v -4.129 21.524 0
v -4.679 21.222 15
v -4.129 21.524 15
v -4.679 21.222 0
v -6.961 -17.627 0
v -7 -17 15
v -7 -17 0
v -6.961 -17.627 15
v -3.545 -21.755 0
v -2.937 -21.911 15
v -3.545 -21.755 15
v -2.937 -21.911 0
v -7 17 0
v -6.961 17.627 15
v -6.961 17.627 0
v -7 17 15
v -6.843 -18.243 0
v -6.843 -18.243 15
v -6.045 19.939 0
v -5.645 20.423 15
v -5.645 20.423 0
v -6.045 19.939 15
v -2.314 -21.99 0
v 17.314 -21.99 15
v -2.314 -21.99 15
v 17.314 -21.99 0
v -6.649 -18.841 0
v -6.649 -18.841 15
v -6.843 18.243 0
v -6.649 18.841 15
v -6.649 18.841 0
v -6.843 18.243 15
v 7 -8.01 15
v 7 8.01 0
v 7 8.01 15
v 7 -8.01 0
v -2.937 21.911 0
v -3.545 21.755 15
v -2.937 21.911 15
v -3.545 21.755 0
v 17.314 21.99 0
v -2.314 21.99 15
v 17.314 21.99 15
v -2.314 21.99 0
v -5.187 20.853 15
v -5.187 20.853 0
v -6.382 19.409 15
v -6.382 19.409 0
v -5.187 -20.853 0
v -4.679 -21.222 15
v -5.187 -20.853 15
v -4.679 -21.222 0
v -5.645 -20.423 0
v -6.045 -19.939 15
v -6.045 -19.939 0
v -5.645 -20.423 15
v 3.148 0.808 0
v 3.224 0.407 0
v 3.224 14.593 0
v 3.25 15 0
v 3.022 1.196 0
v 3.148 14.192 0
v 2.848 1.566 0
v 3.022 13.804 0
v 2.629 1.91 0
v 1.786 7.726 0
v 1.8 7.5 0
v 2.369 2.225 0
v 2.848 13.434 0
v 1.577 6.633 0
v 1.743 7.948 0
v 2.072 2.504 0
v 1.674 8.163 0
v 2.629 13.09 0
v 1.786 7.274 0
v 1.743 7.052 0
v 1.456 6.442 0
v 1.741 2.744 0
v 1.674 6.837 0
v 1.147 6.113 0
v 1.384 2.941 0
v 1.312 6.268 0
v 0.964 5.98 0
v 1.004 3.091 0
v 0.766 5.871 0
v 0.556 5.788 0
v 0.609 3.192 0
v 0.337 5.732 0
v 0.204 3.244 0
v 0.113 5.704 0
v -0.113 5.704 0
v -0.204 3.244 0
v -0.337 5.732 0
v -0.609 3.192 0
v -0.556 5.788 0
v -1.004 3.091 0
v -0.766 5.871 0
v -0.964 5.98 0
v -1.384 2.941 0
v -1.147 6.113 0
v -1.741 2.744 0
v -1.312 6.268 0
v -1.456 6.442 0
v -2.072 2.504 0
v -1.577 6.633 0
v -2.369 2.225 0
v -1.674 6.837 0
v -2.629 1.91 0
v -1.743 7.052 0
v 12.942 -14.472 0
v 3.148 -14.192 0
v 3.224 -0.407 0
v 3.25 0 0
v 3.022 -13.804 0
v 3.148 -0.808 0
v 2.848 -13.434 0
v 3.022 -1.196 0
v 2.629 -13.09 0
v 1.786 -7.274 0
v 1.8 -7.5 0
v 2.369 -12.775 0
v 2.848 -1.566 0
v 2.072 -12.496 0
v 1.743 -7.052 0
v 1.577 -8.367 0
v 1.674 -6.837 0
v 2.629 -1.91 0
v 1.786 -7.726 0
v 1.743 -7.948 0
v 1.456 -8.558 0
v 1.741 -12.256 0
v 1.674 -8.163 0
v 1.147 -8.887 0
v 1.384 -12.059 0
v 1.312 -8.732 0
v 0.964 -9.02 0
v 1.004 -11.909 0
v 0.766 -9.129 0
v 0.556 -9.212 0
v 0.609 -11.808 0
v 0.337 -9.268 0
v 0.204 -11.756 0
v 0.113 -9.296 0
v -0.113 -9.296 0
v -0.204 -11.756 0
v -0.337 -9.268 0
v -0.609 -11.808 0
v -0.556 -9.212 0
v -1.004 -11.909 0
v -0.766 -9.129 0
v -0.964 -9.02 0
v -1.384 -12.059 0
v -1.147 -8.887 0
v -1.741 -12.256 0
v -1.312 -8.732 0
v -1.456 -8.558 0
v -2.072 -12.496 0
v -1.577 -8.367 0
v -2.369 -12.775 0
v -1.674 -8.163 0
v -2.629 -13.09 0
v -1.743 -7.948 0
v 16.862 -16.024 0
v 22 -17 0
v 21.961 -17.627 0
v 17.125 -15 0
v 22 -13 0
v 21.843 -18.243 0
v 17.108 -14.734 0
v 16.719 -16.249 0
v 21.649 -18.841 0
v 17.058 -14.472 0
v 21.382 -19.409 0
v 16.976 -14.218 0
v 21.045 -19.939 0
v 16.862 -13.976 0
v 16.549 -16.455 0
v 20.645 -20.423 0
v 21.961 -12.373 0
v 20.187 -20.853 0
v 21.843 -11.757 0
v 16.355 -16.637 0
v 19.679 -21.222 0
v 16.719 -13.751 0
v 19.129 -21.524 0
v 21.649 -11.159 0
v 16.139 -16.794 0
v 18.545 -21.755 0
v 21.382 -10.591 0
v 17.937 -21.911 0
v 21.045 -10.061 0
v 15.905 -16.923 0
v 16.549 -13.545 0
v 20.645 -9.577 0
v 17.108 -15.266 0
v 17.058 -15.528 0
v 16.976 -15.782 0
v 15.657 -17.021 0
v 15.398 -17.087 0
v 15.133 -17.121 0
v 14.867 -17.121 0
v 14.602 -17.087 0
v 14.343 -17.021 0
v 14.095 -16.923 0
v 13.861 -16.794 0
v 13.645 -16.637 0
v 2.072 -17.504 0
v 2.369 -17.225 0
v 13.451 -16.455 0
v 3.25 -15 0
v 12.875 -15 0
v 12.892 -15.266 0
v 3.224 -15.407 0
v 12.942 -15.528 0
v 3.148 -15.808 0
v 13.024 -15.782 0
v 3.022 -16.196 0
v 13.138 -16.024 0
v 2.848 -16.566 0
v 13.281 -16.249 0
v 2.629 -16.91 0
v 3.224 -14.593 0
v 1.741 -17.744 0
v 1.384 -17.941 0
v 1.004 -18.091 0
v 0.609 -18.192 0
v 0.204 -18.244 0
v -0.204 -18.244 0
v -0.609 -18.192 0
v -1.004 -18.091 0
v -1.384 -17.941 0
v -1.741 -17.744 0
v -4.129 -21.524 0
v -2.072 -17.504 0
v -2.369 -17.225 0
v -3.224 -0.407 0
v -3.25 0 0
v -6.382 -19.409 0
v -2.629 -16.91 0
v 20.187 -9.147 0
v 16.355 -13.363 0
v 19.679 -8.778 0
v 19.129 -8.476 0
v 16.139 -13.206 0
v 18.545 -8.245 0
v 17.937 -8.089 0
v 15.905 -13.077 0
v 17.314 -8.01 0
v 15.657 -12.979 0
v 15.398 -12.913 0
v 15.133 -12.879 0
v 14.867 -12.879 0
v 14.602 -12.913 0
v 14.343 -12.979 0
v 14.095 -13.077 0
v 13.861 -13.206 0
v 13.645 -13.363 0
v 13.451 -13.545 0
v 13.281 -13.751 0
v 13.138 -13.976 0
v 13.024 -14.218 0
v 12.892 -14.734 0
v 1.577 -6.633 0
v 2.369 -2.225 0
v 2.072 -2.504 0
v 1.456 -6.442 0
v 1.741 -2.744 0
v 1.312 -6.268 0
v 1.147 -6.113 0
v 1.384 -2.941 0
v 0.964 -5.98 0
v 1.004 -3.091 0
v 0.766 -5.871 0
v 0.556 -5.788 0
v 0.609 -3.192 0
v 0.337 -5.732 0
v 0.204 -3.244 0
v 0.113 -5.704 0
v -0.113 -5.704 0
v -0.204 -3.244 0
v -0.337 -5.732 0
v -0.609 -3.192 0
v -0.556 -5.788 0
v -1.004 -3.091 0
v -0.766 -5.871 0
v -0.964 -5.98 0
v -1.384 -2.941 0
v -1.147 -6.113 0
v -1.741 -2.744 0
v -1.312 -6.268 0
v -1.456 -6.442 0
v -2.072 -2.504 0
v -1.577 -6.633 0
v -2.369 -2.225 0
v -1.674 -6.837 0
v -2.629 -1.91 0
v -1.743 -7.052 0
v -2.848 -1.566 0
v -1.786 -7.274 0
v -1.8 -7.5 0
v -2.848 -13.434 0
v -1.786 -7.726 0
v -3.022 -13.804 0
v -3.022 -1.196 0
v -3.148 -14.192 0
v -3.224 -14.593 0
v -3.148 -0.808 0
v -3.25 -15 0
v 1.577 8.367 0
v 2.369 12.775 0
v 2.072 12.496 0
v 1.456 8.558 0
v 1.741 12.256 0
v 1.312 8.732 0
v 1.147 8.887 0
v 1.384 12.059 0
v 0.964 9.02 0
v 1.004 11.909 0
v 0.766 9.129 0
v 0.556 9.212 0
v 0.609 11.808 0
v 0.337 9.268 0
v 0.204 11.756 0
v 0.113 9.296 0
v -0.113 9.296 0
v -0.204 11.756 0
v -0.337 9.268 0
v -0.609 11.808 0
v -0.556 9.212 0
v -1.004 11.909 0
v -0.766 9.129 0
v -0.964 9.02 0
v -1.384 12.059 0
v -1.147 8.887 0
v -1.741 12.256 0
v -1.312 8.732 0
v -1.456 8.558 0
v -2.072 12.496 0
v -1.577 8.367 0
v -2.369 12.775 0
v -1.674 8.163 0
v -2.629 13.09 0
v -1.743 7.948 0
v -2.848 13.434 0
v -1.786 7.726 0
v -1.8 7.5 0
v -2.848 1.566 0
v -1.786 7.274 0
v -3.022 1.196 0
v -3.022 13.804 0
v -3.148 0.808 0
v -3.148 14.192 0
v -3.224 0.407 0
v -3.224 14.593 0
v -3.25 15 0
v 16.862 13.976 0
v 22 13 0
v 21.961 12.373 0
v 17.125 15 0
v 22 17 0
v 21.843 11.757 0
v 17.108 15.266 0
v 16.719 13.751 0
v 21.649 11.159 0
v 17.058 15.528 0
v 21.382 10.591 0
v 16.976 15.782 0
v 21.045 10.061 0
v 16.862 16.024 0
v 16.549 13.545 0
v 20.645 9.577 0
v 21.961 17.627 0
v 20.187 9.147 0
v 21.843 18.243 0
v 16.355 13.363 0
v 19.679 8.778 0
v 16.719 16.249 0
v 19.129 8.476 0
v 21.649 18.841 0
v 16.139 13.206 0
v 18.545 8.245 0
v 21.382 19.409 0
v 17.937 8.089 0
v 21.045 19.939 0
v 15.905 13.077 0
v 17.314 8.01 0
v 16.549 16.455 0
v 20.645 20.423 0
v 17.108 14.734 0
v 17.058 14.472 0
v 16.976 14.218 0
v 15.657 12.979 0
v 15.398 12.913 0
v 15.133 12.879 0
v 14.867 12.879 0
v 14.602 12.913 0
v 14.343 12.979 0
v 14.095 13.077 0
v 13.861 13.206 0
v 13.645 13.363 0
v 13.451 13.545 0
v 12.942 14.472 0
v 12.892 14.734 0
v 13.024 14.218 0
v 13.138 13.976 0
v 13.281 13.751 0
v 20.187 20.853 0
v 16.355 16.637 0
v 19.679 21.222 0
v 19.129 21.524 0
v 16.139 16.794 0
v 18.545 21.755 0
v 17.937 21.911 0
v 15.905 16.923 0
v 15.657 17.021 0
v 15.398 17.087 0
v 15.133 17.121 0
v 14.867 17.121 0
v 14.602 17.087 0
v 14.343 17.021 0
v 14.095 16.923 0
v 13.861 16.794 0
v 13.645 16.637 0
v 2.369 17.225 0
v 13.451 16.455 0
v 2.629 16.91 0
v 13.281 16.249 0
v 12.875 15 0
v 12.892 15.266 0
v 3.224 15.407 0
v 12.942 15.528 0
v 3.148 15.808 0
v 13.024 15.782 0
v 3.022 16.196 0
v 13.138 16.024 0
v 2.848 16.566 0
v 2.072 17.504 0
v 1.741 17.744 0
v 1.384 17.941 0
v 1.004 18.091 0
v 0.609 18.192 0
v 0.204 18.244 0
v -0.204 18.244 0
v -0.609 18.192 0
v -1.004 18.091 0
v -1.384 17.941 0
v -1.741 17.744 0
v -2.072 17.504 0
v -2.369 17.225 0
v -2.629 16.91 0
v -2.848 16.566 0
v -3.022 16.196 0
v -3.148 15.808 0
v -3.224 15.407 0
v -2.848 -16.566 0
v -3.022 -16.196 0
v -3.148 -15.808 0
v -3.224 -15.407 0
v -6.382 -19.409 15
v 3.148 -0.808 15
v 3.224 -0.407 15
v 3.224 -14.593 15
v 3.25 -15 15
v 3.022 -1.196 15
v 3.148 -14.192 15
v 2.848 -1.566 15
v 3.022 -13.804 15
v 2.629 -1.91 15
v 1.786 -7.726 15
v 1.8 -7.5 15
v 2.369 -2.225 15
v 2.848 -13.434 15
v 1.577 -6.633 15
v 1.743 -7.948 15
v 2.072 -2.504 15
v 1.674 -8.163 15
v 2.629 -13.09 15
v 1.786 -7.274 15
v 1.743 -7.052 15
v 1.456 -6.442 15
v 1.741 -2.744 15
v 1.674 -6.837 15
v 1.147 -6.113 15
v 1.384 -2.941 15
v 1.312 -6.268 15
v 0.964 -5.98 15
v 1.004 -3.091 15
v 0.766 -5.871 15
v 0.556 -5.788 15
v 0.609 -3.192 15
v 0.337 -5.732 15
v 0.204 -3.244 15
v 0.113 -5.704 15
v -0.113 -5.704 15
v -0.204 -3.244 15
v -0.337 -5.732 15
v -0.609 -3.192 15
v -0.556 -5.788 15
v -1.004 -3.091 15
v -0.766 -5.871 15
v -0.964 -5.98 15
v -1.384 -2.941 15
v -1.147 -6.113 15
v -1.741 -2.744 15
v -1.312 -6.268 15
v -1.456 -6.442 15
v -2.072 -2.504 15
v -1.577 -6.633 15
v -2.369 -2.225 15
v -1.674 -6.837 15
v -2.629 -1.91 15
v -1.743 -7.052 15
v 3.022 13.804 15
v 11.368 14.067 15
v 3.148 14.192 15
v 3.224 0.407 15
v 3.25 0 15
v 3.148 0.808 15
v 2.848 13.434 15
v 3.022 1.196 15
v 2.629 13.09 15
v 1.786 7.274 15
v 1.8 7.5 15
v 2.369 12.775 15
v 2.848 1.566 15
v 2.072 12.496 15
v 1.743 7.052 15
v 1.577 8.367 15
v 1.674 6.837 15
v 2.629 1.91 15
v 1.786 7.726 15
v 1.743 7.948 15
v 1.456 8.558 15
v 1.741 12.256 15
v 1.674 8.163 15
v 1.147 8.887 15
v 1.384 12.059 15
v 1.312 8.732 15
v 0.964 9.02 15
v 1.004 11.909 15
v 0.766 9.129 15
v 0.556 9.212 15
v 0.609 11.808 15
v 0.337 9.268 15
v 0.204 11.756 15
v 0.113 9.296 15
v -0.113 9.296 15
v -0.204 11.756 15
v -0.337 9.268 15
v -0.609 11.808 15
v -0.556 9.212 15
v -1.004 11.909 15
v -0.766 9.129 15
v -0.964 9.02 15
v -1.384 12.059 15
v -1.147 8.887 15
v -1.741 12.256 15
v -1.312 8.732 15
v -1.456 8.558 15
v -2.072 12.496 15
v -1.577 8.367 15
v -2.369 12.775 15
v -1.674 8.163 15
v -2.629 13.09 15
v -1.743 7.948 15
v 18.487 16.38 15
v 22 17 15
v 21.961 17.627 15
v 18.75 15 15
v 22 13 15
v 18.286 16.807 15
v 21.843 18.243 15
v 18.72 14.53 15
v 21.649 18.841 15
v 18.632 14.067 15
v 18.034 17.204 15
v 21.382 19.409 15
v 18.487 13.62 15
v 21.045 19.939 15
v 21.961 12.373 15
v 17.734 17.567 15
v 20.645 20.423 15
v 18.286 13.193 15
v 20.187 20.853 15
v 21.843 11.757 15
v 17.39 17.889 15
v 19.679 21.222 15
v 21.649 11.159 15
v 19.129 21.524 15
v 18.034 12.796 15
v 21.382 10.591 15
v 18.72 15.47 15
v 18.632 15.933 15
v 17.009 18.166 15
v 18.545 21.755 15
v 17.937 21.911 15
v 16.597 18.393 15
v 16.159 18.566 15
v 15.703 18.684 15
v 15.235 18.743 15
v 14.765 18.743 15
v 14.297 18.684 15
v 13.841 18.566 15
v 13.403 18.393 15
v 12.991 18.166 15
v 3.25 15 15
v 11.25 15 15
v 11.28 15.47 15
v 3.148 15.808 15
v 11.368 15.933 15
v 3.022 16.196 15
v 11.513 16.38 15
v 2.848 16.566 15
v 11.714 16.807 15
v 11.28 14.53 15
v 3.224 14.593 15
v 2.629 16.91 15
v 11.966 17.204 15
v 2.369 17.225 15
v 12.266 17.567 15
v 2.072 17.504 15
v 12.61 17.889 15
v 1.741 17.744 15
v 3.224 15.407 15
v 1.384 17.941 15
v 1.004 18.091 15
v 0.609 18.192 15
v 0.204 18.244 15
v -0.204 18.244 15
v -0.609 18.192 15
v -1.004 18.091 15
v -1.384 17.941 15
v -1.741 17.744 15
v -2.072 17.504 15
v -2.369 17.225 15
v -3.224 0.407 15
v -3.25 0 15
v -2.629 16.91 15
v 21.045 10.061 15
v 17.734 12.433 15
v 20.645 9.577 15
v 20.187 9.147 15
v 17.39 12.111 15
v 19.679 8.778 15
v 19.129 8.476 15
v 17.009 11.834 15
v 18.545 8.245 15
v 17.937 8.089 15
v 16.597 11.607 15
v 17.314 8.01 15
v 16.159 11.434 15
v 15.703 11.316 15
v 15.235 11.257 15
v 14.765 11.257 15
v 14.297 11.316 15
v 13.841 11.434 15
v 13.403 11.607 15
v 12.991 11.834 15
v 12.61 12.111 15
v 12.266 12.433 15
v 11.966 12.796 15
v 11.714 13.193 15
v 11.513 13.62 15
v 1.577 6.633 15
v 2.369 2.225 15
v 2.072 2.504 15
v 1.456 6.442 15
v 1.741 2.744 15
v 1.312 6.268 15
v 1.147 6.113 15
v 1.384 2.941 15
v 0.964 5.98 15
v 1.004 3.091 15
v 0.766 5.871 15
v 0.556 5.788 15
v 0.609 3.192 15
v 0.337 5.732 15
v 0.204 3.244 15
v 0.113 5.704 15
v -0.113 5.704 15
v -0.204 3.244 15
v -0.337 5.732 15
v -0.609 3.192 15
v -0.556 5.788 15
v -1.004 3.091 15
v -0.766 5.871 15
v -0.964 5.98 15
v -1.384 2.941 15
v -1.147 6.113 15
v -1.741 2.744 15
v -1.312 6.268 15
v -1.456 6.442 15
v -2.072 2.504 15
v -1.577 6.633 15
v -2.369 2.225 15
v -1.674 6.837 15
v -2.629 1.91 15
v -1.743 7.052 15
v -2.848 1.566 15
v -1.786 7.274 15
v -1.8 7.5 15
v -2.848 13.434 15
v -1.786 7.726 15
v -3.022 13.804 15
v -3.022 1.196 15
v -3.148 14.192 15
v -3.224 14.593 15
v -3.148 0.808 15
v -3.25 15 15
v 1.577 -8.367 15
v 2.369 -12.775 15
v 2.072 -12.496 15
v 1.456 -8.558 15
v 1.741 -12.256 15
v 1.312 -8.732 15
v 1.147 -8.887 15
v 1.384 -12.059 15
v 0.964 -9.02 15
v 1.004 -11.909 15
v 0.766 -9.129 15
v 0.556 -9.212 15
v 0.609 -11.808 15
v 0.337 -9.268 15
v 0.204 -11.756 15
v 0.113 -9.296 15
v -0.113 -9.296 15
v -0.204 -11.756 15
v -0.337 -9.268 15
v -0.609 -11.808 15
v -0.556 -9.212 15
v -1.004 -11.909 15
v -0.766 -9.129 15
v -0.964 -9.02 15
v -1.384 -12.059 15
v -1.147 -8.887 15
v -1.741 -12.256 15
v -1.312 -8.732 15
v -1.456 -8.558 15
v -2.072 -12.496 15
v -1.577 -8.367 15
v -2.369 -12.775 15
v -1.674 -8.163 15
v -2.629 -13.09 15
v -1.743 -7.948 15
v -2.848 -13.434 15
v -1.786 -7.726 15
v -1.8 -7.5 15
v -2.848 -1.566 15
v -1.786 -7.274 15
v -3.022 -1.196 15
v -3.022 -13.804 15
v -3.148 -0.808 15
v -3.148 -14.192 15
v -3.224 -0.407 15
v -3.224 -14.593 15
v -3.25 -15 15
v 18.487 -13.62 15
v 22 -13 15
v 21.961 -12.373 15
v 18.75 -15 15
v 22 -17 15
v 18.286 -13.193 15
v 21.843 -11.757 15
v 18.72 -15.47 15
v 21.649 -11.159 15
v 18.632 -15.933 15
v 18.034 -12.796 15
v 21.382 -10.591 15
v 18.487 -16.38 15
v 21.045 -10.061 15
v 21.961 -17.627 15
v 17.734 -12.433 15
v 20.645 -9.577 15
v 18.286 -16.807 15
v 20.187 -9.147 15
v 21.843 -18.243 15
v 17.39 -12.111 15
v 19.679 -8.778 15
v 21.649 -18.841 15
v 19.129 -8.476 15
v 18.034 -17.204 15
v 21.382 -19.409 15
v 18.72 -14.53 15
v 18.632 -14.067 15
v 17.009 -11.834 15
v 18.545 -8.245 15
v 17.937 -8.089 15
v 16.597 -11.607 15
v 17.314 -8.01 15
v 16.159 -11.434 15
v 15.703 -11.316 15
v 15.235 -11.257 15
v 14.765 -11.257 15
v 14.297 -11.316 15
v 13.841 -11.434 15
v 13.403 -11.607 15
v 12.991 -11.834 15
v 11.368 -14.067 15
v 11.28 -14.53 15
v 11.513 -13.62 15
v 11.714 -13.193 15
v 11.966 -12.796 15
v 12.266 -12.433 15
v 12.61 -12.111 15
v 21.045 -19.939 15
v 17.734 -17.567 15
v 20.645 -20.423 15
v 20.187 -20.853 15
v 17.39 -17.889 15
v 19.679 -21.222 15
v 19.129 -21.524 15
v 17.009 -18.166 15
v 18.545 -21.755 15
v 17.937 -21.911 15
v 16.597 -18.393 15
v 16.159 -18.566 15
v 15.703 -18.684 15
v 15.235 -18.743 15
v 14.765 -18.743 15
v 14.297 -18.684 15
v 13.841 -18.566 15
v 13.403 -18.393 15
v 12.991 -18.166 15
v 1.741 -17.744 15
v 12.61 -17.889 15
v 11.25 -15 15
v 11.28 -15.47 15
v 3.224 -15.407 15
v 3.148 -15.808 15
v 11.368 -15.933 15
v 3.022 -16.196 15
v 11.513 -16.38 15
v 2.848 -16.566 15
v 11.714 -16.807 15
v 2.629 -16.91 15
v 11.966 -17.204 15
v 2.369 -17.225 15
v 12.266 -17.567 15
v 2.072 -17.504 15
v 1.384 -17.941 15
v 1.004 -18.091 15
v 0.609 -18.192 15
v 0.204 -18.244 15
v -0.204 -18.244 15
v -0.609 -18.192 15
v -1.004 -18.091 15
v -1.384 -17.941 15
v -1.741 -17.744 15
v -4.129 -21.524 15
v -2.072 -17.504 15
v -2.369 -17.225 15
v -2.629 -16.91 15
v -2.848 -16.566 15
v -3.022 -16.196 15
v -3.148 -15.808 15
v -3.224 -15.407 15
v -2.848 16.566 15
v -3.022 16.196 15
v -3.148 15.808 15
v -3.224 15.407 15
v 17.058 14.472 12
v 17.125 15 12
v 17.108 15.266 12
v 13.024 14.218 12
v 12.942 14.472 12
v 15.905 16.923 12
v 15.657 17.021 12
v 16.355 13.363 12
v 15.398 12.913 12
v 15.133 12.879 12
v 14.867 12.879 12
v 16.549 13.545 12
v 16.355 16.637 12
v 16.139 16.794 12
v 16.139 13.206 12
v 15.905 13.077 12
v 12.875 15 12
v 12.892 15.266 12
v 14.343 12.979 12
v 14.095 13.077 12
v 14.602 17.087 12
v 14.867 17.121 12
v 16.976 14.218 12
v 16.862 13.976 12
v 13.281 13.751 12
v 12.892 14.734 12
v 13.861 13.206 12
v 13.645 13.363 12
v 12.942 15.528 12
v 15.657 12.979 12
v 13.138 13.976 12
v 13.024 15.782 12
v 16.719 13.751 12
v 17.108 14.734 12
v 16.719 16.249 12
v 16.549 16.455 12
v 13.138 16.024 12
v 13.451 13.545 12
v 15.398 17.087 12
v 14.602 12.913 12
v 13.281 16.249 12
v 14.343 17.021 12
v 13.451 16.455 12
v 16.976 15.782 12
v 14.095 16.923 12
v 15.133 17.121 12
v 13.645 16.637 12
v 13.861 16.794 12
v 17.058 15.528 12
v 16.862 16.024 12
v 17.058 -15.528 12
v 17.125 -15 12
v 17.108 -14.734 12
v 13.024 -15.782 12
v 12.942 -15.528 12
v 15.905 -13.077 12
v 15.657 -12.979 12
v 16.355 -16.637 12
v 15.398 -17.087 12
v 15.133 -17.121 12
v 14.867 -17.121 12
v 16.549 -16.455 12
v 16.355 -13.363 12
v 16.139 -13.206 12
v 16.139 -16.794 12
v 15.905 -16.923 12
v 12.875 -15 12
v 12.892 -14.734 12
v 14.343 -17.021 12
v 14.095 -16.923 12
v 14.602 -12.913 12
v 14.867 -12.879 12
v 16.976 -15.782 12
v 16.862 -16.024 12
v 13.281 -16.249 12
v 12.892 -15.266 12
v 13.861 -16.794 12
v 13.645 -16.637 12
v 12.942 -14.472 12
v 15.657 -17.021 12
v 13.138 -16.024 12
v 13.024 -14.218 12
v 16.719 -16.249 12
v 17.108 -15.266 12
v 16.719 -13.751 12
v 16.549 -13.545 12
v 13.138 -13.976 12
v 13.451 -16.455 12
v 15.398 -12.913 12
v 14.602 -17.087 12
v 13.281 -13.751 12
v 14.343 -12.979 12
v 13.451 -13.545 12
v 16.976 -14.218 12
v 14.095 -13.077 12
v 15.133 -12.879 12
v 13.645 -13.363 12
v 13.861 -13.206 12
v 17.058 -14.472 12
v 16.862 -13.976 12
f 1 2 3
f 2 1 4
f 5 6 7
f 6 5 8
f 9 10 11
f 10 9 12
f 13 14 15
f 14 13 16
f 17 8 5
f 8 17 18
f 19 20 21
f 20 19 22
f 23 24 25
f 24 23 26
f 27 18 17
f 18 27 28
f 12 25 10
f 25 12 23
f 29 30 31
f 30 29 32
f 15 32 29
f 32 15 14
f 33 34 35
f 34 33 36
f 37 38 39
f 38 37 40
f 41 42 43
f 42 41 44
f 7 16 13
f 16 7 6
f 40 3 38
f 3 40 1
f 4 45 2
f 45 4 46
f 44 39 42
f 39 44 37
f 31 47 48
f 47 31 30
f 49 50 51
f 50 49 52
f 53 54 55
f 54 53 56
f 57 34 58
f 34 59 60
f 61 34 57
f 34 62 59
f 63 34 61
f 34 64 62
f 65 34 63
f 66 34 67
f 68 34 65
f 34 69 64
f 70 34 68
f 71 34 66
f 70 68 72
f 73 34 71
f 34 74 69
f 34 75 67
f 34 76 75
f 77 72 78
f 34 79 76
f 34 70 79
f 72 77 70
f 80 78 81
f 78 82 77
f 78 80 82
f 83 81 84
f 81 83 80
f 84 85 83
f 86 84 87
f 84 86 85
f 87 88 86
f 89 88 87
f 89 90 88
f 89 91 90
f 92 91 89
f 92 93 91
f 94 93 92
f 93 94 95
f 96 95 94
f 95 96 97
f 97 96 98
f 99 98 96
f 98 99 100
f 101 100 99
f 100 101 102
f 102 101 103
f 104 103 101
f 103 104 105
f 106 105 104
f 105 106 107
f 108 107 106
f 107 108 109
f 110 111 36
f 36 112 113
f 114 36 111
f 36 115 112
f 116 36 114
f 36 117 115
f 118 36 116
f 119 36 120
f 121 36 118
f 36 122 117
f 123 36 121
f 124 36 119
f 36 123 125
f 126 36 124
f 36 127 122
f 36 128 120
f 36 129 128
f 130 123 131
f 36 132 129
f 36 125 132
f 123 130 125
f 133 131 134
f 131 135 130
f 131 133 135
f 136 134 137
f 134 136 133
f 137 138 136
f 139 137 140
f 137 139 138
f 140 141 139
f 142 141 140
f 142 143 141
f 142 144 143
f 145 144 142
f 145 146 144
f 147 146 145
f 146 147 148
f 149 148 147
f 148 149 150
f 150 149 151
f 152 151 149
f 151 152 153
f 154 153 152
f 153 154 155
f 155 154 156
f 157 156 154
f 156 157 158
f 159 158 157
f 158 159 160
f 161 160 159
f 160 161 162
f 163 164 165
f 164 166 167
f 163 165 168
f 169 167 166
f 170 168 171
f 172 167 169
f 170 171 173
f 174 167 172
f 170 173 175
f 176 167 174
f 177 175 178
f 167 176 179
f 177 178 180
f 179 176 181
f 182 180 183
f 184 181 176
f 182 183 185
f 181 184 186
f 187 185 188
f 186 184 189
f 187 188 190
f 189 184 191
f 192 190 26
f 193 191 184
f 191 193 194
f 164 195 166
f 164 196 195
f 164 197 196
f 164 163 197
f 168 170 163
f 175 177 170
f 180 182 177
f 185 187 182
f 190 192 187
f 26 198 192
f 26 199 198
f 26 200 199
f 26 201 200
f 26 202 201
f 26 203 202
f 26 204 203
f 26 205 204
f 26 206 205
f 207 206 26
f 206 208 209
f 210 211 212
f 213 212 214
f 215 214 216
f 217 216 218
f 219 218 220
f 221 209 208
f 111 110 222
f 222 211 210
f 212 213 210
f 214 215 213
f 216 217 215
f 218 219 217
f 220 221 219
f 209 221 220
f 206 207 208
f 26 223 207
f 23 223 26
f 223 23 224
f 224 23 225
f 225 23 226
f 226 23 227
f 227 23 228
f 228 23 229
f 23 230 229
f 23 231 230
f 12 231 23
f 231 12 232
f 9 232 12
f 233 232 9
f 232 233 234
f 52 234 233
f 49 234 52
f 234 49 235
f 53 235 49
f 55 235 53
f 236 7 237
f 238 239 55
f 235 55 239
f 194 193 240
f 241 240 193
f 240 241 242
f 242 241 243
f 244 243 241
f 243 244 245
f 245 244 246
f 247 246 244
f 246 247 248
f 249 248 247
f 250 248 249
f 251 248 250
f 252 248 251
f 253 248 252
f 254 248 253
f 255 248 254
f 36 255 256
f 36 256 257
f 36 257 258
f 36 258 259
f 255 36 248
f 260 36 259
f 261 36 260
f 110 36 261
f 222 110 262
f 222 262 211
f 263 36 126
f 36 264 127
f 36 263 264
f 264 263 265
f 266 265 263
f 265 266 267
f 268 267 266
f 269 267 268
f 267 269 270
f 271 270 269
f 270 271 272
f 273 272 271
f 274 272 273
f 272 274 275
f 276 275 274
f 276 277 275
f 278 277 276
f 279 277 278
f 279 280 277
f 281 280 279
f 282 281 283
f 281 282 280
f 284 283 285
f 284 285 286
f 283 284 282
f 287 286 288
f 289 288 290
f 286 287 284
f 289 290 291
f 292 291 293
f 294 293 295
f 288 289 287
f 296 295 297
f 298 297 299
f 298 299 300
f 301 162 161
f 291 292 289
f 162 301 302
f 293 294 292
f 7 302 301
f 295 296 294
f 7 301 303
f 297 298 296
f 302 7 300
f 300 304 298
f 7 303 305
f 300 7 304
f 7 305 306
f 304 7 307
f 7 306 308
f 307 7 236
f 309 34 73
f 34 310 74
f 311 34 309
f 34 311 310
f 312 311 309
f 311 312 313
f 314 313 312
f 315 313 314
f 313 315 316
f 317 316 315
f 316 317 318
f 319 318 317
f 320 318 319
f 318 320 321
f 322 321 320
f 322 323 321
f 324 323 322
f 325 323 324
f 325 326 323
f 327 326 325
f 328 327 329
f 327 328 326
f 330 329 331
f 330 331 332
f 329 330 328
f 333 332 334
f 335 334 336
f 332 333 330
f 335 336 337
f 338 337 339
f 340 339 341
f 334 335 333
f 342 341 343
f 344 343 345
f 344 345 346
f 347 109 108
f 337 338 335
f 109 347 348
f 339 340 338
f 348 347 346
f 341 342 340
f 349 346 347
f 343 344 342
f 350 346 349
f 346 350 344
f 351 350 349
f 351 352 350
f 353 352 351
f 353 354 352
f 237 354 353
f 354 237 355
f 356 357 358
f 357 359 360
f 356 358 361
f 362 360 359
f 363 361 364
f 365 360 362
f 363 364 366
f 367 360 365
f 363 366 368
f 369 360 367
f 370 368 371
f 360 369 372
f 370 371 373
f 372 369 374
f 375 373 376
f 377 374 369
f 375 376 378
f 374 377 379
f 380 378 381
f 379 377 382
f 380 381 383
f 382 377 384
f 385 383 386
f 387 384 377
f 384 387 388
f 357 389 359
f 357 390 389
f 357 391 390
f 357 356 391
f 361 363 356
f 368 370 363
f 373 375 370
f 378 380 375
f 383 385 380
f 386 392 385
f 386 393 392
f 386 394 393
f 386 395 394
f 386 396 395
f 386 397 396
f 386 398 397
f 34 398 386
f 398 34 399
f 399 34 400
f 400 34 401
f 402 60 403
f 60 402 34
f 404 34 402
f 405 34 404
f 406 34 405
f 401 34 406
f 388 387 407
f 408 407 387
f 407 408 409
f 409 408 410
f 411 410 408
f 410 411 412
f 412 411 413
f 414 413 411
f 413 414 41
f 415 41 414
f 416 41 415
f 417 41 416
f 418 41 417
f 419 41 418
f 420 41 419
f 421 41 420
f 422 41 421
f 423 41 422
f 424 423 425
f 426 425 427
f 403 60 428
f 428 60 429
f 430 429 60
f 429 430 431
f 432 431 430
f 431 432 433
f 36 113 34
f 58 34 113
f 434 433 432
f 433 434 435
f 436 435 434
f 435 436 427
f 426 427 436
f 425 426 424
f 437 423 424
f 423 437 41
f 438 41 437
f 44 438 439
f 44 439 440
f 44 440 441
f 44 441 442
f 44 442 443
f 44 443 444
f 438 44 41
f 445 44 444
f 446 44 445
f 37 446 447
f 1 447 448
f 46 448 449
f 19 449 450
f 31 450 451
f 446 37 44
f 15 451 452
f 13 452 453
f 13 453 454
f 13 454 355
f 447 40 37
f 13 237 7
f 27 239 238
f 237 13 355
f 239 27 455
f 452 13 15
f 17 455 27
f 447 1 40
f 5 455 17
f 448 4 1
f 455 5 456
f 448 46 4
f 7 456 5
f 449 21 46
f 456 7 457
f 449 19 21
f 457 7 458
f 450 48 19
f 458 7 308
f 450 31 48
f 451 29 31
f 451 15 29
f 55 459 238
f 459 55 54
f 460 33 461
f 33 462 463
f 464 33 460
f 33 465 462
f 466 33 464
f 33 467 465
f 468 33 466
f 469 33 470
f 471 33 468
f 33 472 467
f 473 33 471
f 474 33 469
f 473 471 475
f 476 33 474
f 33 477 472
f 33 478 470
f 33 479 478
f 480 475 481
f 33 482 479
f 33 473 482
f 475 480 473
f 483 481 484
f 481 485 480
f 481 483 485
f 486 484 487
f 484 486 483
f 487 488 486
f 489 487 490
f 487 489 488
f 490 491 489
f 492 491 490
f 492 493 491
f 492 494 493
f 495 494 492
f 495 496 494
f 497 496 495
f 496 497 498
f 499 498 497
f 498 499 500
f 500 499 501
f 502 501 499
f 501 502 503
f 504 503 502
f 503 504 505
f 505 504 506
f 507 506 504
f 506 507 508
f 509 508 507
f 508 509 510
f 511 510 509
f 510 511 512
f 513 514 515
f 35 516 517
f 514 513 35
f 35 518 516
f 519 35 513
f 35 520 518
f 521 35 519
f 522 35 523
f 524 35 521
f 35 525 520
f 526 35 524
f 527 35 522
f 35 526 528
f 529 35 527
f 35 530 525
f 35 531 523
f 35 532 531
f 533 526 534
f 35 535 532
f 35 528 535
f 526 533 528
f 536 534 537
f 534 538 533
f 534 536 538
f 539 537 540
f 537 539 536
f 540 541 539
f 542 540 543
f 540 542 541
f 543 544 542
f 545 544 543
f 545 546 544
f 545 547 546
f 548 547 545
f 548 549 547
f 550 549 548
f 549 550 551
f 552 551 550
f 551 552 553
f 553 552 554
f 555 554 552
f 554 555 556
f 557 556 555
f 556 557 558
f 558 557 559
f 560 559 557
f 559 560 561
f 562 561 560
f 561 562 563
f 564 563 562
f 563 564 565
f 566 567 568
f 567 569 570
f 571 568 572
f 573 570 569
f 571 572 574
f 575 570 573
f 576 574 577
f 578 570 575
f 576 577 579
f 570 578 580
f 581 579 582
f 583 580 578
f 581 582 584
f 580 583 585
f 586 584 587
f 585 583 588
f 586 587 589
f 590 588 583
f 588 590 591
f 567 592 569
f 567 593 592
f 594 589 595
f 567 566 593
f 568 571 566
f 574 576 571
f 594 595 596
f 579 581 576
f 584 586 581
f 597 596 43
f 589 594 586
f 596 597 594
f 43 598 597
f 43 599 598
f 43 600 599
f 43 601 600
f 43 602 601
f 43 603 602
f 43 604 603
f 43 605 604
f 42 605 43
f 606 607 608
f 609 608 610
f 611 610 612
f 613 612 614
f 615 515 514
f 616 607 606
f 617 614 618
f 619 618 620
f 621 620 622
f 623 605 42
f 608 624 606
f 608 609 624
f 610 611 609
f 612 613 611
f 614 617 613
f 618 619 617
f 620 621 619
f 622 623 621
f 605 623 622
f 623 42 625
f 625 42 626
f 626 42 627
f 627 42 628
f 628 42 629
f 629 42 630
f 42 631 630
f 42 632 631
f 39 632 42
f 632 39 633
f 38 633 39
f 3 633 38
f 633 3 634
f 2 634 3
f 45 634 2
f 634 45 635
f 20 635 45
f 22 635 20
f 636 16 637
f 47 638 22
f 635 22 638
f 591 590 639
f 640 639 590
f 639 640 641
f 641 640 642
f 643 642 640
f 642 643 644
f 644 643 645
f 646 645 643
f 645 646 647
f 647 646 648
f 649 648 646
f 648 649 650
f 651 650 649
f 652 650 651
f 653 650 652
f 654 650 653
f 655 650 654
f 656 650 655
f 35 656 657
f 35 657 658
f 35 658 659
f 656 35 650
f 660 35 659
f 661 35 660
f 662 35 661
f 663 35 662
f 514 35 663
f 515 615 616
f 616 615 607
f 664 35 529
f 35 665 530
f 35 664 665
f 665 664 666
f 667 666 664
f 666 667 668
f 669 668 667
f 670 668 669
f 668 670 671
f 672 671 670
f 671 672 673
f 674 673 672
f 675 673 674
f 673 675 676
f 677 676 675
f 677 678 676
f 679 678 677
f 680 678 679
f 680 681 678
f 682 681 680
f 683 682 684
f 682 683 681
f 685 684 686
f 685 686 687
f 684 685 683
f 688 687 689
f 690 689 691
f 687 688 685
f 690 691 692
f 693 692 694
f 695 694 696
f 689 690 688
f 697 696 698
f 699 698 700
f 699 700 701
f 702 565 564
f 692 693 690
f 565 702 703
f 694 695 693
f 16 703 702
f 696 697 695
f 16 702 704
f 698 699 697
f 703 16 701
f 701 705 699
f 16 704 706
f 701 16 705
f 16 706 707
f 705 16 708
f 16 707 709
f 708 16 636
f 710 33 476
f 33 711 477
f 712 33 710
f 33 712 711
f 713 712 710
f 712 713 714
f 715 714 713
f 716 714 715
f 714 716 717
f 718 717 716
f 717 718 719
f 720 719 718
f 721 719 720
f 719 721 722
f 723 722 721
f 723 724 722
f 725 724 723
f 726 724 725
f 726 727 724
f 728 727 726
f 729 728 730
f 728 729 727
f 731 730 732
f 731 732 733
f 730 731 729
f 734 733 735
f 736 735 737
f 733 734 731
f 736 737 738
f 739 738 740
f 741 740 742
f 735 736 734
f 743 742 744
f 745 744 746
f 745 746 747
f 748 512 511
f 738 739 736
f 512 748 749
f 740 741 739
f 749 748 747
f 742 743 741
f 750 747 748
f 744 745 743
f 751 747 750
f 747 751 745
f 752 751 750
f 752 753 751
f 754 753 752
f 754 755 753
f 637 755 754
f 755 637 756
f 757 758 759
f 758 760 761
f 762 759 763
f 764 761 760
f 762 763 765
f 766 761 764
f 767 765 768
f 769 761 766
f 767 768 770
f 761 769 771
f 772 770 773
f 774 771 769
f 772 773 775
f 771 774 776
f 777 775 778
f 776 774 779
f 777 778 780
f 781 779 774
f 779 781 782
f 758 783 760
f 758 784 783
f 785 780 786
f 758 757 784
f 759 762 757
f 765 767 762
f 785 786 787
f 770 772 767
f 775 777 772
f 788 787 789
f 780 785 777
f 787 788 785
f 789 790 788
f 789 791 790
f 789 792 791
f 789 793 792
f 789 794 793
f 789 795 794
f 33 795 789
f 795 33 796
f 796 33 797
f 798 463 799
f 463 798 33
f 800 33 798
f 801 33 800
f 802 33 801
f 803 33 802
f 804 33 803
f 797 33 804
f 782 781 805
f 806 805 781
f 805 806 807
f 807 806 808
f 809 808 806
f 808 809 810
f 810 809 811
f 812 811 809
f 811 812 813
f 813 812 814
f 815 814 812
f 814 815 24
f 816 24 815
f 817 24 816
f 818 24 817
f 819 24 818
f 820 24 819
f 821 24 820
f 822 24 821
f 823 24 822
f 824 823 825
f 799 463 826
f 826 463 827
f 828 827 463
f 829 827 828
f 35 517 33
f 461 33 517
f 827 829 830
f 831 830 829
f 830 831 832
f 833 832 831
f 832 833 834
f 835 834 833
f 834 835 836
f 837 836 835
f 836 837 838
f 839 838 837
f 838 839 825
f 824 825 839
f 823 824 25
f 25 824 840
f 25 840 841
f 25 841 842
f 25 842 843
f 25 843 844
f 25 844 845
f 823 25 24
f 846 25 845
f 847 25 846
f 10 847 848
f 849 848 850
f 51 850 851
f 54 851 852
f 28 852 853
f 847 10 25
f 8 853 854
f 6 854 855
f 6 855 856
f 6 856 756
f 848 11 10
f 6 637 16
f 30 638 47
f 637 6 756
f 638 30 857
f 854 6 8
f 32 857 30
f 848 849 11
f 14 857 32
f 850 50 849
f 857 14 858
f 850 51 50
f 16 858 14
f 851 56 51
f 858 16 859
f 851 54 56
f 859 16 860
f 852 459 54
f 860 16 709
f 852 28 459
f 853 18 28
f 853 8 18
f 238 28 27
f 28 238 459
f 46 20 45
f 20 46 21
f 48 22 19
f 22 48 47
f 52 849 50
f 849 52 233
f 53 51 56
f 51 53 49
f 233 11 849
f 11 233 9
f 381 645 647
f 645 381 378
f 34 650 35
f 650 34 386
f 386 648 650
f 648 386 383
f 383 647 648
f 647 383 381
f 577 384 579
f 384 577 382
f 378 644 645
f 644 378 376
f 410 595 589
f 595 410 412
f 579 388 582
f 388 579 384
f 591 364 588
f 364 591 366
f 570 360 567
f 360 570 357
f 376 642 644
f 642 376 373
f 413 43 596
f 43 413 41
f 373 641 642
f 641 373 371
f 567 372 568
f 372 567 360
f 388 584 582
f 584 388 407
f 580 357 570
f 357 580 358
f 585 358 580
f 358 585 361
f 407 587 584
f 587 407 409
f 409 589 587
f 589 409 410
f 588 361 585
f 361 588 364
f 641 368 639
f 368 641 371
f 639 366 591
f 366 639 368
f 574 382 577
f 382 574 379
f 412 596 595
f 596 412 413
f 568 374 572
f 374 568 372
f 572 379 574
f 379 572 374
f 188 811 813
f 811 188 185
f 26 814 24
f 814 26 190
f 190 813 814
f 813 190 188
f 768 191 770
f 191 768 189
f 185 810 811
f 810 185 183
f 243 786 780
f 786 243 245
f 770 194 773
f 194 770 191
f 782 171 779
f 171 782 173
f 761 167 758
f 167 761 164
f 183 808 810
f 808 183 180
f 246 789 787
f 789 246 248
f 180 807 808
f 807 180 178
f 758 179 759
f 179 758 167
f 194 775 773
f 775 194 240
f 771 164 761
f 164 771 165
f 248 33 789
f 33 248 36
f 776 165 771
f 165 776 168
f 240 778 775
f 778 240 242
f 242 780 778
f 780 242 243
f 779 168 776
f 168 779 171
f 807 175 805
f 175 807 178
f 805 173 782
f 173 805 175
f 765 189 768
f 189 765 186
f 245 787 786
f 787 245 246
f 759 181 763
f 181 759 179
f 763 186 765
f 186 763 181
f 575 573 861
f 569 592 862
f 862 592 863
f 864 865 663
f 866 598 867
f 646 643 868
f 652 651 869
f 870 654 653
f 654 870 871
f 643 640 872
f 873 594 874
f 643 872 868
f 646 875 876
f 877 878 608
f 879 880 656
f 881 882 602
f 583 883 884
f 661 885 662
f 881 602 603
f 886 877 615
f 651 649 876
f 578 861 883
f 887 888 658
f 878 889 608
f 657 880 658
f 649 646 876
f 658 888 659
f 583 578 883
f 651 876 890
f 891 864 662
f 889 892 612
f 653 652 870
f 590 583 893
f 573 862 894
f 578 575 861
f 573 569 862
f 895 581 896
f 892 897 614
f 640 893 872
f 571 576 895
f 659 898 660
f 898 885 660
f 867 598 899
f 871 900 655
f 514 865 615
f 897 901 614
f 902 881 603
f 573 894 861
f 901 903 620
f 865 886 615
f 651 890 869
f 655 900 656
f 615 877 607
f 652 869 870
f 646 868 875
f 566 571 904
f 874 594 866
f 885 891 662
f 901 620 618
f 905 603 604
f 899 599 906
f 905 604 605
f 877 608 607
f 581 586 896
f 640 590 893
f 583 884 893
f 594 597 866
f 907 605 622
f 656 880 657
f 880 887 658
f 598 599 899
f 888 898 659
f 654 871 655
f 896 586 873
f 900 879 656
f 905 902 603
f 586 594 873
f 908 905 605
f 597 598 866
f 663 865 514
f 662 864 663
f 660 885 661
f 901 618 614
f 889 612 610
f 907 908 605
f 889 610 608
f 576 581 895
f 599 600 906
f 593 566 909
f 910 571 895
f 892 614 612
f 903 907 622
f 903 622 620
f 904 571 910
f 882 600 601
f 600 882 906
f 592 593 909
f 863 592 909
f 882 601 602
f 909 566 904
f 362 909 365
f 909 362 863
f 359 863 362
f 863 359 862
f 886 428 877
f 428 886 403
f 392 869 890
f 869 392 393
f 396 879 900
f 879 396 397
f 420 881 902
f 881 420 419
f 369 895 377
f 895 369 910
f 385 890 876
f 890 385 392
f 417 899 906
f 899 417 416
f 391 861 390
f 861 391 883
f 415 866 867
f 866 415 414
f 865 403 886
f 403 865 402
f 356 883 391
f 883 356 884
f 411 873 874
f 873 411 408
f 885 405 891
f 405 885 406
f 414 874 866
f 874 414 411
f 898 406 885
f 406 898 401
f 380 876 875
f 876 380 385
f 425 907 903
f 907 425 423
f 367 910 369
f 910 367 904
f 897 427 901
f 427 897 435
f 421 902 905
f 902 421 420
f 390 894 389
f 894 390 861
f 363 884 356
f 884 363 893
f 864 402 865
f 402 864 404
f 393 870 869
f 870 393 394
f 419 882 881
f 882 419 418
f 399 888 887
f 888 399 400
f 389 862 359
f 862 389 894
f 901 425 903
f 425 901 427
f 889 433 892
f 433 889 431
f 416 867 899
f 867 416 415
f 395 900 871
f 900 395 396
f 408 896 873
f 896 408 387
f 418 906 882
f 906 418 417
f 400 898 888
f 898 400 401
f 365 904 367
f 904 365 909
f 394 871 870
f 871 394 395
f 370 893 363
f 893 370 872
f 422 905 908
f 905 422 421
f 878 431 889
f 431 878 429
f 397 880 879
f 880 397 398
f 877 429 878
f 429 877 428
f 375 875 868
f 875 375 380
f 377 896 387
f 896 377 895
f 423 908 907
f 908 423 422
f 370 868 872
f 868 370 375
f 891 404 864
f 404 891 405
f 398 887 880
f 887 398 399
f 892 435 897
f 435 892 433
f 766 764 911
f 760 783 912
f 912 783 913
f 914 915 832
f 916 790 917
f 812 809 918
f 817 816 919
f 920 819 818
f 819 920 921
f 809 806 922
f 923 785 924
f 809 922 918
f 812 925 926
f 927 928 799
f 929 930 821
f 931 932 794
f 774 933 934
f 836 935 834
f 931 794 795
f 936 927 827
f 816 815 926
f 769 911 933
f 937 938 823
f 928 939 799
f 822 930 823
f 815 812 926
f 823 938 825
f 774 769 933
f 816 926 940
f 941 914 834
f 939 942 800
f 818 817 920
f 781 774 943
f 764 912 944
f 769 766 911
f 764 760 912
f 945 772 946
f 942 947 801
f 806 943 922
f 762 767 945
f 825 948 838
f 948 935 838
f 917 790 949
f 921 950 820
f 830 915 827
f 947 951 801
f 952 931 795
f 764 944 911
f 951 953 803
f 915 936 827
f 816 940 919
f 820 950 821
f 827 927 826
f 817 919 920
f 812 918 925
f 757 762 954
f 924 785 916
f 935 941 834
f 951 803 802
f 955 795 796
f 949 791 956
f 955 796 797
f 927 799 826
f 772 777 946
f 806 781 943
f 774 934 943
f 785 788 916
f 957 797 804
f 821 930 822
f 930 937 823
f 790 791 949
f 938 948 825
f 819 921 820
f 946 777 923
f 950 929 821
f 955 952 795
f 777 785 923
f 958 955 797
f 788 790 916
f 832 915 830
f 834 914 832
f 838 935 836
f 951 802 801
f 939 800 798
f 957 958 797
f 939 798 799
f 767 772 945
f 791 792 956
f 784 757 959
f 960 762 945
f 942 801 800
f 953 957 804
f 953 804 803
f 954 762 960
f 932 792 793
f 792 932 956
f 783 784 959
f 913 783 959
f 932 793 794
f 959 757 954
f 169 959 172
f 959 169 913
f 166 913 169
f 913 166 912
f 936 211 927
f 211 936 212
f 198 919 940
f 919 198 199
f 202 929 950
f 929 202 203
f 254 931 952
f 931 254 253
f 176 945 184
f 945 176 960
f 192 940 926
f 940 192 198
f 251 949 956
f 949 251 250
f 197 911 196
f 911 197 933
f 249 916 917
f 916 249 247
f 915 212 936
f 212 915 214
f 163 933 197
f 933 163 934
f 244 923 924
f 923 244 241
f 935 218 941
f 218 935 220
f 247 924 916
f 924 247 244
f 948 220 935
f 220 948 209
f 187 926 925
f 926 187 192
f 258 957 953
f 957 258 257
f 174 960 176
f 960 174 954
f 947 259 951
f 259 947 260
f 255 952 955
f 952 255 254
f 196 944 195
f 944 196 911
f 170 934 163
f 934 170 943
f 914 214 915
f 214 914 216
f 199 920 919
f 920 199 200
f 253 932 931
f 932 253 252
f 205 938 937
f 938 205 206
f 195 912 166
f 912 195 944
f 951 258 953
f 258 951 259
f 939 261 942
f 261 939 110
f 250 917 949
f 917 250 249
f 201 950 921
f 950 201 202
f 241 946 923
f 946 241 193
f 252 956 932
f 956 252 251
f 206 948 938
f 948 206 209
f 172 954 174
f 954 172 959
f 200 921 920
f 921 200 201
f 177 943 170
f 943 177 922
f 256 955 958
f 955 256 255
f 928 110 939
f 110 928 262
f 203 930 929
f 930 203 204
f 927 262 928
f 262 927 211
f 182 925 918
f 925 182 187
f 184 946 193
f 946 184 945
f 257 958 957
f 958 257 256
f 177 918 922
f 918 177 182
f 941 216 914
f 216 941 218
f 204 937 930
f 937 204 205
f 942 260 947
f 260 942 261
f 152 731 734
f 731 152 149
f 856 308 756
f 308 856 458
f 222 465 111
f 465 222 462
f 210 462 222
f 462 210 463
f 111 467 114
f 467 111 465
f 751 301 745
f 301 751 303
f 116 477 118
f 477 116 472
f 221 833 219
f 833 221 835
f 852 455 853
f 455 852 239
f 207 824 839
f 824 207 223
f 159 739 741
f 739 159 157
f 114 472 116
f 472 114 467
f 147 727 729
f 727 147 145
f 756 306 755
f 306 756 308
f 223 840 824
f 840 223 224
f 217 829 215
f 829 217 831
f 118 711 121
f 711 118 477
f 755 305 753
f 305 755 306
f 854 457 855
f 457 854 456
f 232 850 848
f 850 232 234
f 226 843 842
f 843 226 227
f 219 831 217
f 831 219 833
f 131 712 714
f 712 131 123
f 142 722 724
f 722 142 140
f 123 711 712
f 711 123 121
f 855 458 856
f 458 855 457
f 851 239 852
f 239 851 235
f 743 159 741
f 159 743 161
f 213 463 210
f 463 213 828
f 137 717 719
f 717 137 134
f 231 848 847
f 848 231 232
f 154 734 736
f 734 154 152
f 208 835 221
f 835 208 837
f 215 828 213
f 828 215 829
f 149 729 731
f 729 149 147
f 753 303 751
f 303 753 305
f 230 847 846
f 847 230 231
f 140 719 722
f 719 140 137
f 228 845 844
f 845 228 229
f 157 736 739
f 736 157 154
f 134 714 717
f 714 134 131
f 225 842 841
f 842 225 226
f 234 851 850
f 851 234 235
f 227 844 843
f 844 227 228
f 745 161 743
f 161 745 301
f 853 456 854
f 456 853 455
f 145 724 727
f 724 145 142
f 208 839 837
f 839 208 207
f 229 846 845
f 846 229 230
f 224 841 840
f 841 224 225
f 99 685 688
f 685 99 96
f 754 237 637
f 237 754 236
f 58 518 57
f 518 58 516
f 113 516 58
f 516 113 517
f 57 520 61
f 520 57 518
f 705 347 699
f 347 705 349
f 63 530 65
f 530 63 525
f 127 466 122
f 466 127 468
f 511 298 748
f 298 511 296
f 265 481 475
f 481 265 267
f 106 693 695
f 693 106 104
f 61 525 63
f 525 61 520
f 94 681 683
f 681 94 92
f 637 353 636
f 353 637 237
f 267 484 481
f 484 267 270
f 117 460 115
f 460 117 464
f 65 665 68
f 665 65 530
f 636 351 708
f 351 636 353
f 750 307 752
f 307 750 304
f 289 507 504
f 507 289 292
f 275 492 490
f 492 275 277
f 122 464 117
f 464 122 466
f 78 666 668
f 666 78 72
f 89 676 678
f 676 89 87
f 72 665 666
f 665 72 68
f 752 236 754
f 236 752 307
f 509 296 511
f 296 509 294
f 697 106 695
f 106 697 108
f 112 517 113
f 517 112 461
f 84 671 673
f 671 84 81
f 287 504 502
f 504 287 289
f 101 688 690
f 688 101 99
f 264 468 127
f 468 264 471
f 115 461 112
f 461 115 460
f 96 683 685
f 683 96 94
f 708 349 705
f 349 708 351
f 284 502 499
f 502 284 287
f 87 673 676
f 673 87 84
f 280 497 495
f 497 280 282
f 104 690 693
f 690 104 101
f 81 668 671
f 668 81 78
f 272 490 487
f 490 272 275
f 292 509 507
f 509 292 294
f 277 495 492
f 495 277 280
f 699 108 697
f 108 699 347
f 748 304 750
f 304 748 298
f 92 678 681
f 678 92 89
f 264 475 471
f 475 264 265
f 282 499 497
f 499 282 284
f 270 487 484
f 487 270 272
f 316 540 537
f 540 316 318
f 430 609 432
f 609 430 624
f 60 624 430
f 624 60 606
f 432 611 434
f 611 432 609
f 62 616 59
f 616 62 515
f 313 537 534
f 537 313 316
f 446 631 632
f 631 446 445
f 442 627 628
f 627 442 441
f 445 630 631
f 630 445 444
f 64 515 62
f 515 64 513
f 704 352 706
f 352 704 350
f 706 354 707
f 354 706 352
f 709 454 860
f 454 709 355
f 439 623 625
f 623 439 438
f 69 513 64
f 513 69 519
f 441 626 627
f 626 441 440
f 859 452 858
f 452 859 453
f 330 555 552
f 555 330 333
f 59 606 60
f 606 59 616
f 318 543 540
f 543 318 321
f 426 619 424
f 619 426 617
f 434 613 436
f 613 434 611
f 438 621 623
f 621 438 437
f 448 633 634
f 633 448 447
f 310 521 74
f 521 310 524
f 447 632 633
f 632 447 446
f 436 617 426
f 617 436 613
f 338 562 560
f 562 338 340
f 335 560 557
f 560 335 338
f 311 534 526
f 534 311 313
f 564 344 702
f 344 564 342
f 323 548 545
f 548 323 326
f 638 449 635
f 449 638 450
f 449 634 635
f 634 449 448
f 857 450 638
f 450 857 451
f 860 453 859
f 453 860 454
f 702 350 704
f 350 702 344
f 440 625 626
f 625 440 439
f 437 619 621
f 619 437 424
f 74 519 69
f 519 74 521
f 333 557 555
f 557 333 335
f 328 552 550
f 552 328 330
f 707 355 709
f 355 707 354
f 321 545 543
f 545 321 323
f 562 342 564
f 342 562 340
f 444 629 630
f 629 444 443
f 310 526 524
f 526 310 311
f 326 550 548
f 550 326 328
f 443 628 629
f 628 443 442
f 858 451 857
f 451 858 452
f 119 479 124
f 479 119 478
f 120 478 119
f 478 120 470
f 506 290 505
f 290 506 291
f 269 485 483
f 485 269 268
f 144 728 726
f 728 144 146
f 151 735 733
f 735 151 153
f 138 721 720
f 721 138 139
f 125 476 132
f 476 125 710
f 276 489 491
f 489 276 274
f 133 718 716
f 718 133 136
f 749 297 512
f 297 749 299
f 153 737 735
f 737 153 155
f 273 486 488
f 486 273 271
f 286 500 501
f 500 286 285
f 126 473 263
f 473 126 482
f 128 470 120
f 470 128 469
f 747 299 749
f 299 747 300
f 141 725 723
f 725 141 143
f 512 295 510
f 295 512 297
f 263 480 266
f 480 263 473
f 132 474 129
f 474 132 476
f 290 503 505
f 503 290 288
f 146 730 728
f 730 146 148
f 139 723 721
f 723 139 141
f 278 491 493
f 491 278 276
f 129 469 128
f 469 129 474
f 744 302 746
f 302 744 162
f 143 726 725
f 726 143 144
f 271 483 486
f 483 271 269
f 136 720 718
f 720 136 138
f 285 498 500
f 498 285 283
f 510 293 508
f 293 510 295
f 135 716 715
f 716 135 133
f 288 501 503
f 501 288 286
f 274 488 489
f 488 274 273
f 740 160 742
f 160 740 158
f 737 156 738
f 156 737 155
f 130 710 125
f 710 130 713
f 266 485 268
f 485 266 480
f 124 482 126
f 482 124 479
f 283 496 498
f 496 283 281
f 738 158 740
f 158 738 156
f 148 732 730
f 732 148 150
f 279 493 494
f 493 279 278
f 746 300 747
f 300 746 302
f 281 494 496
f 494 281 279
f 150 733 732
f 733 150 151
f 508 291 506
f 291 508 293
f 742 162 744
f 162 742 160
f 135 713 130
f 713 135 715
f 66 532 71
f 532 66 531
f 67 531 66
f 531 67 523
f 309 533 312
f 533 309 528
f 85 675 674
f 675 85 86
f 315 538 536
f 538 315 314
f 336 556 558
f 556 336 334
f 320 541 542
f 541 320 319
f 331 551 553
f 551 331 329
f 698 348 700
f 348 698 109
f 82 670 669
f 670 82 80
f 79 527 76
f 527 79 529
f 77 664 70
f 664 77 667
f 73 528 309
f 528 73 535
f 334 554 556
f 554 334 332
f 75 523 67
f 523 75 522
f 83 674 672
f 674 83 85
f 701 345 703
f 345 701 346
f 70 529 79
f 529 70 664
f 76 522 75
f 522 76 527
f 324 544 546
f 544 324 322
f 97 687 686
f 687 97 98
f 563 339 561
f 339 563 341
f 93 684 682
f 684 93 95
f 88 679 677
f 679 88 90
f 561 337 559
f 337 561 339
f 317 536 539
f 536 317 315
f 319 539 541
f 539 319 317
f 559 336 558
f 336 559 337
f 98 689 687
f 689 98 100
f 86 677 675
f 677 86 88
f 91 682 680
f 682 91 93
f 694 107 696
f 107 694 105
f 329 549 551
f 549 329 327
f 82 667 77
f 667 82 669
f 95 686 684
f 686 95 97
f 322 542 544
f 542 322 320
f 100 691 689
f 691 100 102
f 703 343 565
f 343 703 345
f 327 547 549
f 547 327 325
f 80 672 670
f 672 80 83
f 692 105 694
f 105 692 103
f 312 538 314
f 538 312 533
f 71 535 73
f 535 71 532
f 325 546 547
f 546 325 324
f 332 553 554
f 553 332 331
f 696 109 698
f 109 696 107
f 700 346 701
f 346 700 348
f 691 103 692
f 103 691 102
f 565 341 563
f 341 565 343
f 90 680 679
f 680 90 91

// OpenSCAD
$fn = 50;


difference() {
	union() {
		hull() {
			translate(v = [-2.0000000000, 17.0000000000, 0]) {
				cylinder(h = 15, r = 5);
			}
			translate(v = [2.0000000000, 17.0000000000, 0]) {
				cylinder(h = 15, r = 5);
			}
			translate(v = [-2.0000000000, -17.0000000000, 0]) {
				cylinder(h = 15, r = 5);
			}
			translate(v = [2.0000000000, -17.0000000000, 0]) {
				cylinder(h = 15, r = 5);
			}
		}
		translate(v = [7.5000000000, 15.0000000000, 0]) {
			hull() {
				translate(v = [-9.5000000000, 2.0000000000, 0]) {
					cylinder(h = 15, r = 5);
				}
				translate(v = [9.5000000000, 2.0000000000, 0]) {
					cylinder(h = 15, r = 5);
				}
				translate(v = [-9.5000000000, -2.0000000000, 0]) {
					cylinder(h = 15, r = 5);
				}
				translate(v = [9.5000000000, -2.0000000000, 0]) {
					cylinder(h = 15, r = 5);
				}
			}
		}
		translate(v = [7.5000000000, -15.0000000000, 0]) {
			hull() {
				translate(v = [-9.5000000000, 2.0000000000, 0]) {
					cylinder(h = 15, r = 5);
				}
				translate(v = [9.5000000000, 2.0000000000, 0]) {
					cylinder(h = 15, r = 5);
				}
				translate(v = [-9.5000000000, -2.0000000000, 0]) {
					cylinder(h = 15, r = 5);
				}
				translate(v = [9.5000000000, -2.0000000000, 0]) {
					cylinder(h = 15, r = 5);
				}
			}
		}
	}
	union() {
		translate(v = [15.0000000000, 15.0000000000, 15]) {
			rotate(a = [0, 0, 0]) {
				difference() {
					union() {
						#translate(v = [0, 0, -15.0000000000]) {
							cylinder(h = 15, r = 2.0000000000);
						}
						#translate(v = [0, 0, -3]) {
							cylinder(h = 3, r1 = 2.1250000000, r2 = 3.7500000000);
						}
						#translate(v = [0, 0, -15.0000000000]) {
							cylinder(h = 15, r = 2.1250000000);
						}
						#translate(v = [0, 0, -15.0000000000]) {
							cylinder(h = 15, r = 2.0000000000);
						}
					}
					union();
				}
			}
		}
		translate(v = [15.0000000000, -15.0000000000, 15]) {
			rotate(a = [0, 0, 0]) {
				difference() {
					union() {
						#translate(v = [0, 0, -15.0000000000]) {
							cylinder(h = 15, r = 2.0000000000);
						}
						#translate(v = [0, 0, -3]) {
							cylinder(h = 3, r1 = 2.1250000000, r2 = 3.7500000000);
						}
						#translate(v = [0, 0, -15.0000000000]) {
							cylinder(h = 15, r = 2.1250000000);
						}
						#translate(v = [0, 0, -15.0000000000]) {
							cylinder(h = 15, r = 2.0000000000);
						}
					}
					union();
				}
			}
		}
		translate(v = [0.0000000000, -15.0000000000, 0]) {
			translate(v = [0, 0, -100]) {
				cylinder(h = 200, r = 3.2500000000);
			}
		}
		translate(v = [0, 0, -100]) {
			cylinder(h = 200, r = 3.2500000000);
		}
		translate(v = [0.0000000000, 15.0000000000, 0]) {
			translate(v = [0, 0, -100]) {
				cylinder(h = 200, r = 3.2500000000);
			}
		}
		translate(v = [0.0000000000, -15.0000000000, 0]) {
			translate(v = [0, 0, -100]) {
				cylinder(h = 200, r = 1.8000000000);
			}
		}
		translate(v = [0.0000000000, -7.5000000000, 0]) {
			translate(v = [0, 0, -100]) {
				cylinder(h = 200, r = 1.8000000000);
			}
		}
		translate(v = [0, 0, -100]) {
			cylinder(h = 200, r = 1.8000000000);
		}
		translate(v = [0.0000000000, 7.5000000000, 0]) {
			translate(v = [0, 0, -100]) {
				cylinder(h = 200, r = 1.8000000000);
			}
		}
		translate(v = [0.0000000000, 15.0000000000, 0]) {
			translate(v = [0, 0, -100]) {
				cylinder(h = 200, r = 1.8000000000);
			}
		}
	}
}
